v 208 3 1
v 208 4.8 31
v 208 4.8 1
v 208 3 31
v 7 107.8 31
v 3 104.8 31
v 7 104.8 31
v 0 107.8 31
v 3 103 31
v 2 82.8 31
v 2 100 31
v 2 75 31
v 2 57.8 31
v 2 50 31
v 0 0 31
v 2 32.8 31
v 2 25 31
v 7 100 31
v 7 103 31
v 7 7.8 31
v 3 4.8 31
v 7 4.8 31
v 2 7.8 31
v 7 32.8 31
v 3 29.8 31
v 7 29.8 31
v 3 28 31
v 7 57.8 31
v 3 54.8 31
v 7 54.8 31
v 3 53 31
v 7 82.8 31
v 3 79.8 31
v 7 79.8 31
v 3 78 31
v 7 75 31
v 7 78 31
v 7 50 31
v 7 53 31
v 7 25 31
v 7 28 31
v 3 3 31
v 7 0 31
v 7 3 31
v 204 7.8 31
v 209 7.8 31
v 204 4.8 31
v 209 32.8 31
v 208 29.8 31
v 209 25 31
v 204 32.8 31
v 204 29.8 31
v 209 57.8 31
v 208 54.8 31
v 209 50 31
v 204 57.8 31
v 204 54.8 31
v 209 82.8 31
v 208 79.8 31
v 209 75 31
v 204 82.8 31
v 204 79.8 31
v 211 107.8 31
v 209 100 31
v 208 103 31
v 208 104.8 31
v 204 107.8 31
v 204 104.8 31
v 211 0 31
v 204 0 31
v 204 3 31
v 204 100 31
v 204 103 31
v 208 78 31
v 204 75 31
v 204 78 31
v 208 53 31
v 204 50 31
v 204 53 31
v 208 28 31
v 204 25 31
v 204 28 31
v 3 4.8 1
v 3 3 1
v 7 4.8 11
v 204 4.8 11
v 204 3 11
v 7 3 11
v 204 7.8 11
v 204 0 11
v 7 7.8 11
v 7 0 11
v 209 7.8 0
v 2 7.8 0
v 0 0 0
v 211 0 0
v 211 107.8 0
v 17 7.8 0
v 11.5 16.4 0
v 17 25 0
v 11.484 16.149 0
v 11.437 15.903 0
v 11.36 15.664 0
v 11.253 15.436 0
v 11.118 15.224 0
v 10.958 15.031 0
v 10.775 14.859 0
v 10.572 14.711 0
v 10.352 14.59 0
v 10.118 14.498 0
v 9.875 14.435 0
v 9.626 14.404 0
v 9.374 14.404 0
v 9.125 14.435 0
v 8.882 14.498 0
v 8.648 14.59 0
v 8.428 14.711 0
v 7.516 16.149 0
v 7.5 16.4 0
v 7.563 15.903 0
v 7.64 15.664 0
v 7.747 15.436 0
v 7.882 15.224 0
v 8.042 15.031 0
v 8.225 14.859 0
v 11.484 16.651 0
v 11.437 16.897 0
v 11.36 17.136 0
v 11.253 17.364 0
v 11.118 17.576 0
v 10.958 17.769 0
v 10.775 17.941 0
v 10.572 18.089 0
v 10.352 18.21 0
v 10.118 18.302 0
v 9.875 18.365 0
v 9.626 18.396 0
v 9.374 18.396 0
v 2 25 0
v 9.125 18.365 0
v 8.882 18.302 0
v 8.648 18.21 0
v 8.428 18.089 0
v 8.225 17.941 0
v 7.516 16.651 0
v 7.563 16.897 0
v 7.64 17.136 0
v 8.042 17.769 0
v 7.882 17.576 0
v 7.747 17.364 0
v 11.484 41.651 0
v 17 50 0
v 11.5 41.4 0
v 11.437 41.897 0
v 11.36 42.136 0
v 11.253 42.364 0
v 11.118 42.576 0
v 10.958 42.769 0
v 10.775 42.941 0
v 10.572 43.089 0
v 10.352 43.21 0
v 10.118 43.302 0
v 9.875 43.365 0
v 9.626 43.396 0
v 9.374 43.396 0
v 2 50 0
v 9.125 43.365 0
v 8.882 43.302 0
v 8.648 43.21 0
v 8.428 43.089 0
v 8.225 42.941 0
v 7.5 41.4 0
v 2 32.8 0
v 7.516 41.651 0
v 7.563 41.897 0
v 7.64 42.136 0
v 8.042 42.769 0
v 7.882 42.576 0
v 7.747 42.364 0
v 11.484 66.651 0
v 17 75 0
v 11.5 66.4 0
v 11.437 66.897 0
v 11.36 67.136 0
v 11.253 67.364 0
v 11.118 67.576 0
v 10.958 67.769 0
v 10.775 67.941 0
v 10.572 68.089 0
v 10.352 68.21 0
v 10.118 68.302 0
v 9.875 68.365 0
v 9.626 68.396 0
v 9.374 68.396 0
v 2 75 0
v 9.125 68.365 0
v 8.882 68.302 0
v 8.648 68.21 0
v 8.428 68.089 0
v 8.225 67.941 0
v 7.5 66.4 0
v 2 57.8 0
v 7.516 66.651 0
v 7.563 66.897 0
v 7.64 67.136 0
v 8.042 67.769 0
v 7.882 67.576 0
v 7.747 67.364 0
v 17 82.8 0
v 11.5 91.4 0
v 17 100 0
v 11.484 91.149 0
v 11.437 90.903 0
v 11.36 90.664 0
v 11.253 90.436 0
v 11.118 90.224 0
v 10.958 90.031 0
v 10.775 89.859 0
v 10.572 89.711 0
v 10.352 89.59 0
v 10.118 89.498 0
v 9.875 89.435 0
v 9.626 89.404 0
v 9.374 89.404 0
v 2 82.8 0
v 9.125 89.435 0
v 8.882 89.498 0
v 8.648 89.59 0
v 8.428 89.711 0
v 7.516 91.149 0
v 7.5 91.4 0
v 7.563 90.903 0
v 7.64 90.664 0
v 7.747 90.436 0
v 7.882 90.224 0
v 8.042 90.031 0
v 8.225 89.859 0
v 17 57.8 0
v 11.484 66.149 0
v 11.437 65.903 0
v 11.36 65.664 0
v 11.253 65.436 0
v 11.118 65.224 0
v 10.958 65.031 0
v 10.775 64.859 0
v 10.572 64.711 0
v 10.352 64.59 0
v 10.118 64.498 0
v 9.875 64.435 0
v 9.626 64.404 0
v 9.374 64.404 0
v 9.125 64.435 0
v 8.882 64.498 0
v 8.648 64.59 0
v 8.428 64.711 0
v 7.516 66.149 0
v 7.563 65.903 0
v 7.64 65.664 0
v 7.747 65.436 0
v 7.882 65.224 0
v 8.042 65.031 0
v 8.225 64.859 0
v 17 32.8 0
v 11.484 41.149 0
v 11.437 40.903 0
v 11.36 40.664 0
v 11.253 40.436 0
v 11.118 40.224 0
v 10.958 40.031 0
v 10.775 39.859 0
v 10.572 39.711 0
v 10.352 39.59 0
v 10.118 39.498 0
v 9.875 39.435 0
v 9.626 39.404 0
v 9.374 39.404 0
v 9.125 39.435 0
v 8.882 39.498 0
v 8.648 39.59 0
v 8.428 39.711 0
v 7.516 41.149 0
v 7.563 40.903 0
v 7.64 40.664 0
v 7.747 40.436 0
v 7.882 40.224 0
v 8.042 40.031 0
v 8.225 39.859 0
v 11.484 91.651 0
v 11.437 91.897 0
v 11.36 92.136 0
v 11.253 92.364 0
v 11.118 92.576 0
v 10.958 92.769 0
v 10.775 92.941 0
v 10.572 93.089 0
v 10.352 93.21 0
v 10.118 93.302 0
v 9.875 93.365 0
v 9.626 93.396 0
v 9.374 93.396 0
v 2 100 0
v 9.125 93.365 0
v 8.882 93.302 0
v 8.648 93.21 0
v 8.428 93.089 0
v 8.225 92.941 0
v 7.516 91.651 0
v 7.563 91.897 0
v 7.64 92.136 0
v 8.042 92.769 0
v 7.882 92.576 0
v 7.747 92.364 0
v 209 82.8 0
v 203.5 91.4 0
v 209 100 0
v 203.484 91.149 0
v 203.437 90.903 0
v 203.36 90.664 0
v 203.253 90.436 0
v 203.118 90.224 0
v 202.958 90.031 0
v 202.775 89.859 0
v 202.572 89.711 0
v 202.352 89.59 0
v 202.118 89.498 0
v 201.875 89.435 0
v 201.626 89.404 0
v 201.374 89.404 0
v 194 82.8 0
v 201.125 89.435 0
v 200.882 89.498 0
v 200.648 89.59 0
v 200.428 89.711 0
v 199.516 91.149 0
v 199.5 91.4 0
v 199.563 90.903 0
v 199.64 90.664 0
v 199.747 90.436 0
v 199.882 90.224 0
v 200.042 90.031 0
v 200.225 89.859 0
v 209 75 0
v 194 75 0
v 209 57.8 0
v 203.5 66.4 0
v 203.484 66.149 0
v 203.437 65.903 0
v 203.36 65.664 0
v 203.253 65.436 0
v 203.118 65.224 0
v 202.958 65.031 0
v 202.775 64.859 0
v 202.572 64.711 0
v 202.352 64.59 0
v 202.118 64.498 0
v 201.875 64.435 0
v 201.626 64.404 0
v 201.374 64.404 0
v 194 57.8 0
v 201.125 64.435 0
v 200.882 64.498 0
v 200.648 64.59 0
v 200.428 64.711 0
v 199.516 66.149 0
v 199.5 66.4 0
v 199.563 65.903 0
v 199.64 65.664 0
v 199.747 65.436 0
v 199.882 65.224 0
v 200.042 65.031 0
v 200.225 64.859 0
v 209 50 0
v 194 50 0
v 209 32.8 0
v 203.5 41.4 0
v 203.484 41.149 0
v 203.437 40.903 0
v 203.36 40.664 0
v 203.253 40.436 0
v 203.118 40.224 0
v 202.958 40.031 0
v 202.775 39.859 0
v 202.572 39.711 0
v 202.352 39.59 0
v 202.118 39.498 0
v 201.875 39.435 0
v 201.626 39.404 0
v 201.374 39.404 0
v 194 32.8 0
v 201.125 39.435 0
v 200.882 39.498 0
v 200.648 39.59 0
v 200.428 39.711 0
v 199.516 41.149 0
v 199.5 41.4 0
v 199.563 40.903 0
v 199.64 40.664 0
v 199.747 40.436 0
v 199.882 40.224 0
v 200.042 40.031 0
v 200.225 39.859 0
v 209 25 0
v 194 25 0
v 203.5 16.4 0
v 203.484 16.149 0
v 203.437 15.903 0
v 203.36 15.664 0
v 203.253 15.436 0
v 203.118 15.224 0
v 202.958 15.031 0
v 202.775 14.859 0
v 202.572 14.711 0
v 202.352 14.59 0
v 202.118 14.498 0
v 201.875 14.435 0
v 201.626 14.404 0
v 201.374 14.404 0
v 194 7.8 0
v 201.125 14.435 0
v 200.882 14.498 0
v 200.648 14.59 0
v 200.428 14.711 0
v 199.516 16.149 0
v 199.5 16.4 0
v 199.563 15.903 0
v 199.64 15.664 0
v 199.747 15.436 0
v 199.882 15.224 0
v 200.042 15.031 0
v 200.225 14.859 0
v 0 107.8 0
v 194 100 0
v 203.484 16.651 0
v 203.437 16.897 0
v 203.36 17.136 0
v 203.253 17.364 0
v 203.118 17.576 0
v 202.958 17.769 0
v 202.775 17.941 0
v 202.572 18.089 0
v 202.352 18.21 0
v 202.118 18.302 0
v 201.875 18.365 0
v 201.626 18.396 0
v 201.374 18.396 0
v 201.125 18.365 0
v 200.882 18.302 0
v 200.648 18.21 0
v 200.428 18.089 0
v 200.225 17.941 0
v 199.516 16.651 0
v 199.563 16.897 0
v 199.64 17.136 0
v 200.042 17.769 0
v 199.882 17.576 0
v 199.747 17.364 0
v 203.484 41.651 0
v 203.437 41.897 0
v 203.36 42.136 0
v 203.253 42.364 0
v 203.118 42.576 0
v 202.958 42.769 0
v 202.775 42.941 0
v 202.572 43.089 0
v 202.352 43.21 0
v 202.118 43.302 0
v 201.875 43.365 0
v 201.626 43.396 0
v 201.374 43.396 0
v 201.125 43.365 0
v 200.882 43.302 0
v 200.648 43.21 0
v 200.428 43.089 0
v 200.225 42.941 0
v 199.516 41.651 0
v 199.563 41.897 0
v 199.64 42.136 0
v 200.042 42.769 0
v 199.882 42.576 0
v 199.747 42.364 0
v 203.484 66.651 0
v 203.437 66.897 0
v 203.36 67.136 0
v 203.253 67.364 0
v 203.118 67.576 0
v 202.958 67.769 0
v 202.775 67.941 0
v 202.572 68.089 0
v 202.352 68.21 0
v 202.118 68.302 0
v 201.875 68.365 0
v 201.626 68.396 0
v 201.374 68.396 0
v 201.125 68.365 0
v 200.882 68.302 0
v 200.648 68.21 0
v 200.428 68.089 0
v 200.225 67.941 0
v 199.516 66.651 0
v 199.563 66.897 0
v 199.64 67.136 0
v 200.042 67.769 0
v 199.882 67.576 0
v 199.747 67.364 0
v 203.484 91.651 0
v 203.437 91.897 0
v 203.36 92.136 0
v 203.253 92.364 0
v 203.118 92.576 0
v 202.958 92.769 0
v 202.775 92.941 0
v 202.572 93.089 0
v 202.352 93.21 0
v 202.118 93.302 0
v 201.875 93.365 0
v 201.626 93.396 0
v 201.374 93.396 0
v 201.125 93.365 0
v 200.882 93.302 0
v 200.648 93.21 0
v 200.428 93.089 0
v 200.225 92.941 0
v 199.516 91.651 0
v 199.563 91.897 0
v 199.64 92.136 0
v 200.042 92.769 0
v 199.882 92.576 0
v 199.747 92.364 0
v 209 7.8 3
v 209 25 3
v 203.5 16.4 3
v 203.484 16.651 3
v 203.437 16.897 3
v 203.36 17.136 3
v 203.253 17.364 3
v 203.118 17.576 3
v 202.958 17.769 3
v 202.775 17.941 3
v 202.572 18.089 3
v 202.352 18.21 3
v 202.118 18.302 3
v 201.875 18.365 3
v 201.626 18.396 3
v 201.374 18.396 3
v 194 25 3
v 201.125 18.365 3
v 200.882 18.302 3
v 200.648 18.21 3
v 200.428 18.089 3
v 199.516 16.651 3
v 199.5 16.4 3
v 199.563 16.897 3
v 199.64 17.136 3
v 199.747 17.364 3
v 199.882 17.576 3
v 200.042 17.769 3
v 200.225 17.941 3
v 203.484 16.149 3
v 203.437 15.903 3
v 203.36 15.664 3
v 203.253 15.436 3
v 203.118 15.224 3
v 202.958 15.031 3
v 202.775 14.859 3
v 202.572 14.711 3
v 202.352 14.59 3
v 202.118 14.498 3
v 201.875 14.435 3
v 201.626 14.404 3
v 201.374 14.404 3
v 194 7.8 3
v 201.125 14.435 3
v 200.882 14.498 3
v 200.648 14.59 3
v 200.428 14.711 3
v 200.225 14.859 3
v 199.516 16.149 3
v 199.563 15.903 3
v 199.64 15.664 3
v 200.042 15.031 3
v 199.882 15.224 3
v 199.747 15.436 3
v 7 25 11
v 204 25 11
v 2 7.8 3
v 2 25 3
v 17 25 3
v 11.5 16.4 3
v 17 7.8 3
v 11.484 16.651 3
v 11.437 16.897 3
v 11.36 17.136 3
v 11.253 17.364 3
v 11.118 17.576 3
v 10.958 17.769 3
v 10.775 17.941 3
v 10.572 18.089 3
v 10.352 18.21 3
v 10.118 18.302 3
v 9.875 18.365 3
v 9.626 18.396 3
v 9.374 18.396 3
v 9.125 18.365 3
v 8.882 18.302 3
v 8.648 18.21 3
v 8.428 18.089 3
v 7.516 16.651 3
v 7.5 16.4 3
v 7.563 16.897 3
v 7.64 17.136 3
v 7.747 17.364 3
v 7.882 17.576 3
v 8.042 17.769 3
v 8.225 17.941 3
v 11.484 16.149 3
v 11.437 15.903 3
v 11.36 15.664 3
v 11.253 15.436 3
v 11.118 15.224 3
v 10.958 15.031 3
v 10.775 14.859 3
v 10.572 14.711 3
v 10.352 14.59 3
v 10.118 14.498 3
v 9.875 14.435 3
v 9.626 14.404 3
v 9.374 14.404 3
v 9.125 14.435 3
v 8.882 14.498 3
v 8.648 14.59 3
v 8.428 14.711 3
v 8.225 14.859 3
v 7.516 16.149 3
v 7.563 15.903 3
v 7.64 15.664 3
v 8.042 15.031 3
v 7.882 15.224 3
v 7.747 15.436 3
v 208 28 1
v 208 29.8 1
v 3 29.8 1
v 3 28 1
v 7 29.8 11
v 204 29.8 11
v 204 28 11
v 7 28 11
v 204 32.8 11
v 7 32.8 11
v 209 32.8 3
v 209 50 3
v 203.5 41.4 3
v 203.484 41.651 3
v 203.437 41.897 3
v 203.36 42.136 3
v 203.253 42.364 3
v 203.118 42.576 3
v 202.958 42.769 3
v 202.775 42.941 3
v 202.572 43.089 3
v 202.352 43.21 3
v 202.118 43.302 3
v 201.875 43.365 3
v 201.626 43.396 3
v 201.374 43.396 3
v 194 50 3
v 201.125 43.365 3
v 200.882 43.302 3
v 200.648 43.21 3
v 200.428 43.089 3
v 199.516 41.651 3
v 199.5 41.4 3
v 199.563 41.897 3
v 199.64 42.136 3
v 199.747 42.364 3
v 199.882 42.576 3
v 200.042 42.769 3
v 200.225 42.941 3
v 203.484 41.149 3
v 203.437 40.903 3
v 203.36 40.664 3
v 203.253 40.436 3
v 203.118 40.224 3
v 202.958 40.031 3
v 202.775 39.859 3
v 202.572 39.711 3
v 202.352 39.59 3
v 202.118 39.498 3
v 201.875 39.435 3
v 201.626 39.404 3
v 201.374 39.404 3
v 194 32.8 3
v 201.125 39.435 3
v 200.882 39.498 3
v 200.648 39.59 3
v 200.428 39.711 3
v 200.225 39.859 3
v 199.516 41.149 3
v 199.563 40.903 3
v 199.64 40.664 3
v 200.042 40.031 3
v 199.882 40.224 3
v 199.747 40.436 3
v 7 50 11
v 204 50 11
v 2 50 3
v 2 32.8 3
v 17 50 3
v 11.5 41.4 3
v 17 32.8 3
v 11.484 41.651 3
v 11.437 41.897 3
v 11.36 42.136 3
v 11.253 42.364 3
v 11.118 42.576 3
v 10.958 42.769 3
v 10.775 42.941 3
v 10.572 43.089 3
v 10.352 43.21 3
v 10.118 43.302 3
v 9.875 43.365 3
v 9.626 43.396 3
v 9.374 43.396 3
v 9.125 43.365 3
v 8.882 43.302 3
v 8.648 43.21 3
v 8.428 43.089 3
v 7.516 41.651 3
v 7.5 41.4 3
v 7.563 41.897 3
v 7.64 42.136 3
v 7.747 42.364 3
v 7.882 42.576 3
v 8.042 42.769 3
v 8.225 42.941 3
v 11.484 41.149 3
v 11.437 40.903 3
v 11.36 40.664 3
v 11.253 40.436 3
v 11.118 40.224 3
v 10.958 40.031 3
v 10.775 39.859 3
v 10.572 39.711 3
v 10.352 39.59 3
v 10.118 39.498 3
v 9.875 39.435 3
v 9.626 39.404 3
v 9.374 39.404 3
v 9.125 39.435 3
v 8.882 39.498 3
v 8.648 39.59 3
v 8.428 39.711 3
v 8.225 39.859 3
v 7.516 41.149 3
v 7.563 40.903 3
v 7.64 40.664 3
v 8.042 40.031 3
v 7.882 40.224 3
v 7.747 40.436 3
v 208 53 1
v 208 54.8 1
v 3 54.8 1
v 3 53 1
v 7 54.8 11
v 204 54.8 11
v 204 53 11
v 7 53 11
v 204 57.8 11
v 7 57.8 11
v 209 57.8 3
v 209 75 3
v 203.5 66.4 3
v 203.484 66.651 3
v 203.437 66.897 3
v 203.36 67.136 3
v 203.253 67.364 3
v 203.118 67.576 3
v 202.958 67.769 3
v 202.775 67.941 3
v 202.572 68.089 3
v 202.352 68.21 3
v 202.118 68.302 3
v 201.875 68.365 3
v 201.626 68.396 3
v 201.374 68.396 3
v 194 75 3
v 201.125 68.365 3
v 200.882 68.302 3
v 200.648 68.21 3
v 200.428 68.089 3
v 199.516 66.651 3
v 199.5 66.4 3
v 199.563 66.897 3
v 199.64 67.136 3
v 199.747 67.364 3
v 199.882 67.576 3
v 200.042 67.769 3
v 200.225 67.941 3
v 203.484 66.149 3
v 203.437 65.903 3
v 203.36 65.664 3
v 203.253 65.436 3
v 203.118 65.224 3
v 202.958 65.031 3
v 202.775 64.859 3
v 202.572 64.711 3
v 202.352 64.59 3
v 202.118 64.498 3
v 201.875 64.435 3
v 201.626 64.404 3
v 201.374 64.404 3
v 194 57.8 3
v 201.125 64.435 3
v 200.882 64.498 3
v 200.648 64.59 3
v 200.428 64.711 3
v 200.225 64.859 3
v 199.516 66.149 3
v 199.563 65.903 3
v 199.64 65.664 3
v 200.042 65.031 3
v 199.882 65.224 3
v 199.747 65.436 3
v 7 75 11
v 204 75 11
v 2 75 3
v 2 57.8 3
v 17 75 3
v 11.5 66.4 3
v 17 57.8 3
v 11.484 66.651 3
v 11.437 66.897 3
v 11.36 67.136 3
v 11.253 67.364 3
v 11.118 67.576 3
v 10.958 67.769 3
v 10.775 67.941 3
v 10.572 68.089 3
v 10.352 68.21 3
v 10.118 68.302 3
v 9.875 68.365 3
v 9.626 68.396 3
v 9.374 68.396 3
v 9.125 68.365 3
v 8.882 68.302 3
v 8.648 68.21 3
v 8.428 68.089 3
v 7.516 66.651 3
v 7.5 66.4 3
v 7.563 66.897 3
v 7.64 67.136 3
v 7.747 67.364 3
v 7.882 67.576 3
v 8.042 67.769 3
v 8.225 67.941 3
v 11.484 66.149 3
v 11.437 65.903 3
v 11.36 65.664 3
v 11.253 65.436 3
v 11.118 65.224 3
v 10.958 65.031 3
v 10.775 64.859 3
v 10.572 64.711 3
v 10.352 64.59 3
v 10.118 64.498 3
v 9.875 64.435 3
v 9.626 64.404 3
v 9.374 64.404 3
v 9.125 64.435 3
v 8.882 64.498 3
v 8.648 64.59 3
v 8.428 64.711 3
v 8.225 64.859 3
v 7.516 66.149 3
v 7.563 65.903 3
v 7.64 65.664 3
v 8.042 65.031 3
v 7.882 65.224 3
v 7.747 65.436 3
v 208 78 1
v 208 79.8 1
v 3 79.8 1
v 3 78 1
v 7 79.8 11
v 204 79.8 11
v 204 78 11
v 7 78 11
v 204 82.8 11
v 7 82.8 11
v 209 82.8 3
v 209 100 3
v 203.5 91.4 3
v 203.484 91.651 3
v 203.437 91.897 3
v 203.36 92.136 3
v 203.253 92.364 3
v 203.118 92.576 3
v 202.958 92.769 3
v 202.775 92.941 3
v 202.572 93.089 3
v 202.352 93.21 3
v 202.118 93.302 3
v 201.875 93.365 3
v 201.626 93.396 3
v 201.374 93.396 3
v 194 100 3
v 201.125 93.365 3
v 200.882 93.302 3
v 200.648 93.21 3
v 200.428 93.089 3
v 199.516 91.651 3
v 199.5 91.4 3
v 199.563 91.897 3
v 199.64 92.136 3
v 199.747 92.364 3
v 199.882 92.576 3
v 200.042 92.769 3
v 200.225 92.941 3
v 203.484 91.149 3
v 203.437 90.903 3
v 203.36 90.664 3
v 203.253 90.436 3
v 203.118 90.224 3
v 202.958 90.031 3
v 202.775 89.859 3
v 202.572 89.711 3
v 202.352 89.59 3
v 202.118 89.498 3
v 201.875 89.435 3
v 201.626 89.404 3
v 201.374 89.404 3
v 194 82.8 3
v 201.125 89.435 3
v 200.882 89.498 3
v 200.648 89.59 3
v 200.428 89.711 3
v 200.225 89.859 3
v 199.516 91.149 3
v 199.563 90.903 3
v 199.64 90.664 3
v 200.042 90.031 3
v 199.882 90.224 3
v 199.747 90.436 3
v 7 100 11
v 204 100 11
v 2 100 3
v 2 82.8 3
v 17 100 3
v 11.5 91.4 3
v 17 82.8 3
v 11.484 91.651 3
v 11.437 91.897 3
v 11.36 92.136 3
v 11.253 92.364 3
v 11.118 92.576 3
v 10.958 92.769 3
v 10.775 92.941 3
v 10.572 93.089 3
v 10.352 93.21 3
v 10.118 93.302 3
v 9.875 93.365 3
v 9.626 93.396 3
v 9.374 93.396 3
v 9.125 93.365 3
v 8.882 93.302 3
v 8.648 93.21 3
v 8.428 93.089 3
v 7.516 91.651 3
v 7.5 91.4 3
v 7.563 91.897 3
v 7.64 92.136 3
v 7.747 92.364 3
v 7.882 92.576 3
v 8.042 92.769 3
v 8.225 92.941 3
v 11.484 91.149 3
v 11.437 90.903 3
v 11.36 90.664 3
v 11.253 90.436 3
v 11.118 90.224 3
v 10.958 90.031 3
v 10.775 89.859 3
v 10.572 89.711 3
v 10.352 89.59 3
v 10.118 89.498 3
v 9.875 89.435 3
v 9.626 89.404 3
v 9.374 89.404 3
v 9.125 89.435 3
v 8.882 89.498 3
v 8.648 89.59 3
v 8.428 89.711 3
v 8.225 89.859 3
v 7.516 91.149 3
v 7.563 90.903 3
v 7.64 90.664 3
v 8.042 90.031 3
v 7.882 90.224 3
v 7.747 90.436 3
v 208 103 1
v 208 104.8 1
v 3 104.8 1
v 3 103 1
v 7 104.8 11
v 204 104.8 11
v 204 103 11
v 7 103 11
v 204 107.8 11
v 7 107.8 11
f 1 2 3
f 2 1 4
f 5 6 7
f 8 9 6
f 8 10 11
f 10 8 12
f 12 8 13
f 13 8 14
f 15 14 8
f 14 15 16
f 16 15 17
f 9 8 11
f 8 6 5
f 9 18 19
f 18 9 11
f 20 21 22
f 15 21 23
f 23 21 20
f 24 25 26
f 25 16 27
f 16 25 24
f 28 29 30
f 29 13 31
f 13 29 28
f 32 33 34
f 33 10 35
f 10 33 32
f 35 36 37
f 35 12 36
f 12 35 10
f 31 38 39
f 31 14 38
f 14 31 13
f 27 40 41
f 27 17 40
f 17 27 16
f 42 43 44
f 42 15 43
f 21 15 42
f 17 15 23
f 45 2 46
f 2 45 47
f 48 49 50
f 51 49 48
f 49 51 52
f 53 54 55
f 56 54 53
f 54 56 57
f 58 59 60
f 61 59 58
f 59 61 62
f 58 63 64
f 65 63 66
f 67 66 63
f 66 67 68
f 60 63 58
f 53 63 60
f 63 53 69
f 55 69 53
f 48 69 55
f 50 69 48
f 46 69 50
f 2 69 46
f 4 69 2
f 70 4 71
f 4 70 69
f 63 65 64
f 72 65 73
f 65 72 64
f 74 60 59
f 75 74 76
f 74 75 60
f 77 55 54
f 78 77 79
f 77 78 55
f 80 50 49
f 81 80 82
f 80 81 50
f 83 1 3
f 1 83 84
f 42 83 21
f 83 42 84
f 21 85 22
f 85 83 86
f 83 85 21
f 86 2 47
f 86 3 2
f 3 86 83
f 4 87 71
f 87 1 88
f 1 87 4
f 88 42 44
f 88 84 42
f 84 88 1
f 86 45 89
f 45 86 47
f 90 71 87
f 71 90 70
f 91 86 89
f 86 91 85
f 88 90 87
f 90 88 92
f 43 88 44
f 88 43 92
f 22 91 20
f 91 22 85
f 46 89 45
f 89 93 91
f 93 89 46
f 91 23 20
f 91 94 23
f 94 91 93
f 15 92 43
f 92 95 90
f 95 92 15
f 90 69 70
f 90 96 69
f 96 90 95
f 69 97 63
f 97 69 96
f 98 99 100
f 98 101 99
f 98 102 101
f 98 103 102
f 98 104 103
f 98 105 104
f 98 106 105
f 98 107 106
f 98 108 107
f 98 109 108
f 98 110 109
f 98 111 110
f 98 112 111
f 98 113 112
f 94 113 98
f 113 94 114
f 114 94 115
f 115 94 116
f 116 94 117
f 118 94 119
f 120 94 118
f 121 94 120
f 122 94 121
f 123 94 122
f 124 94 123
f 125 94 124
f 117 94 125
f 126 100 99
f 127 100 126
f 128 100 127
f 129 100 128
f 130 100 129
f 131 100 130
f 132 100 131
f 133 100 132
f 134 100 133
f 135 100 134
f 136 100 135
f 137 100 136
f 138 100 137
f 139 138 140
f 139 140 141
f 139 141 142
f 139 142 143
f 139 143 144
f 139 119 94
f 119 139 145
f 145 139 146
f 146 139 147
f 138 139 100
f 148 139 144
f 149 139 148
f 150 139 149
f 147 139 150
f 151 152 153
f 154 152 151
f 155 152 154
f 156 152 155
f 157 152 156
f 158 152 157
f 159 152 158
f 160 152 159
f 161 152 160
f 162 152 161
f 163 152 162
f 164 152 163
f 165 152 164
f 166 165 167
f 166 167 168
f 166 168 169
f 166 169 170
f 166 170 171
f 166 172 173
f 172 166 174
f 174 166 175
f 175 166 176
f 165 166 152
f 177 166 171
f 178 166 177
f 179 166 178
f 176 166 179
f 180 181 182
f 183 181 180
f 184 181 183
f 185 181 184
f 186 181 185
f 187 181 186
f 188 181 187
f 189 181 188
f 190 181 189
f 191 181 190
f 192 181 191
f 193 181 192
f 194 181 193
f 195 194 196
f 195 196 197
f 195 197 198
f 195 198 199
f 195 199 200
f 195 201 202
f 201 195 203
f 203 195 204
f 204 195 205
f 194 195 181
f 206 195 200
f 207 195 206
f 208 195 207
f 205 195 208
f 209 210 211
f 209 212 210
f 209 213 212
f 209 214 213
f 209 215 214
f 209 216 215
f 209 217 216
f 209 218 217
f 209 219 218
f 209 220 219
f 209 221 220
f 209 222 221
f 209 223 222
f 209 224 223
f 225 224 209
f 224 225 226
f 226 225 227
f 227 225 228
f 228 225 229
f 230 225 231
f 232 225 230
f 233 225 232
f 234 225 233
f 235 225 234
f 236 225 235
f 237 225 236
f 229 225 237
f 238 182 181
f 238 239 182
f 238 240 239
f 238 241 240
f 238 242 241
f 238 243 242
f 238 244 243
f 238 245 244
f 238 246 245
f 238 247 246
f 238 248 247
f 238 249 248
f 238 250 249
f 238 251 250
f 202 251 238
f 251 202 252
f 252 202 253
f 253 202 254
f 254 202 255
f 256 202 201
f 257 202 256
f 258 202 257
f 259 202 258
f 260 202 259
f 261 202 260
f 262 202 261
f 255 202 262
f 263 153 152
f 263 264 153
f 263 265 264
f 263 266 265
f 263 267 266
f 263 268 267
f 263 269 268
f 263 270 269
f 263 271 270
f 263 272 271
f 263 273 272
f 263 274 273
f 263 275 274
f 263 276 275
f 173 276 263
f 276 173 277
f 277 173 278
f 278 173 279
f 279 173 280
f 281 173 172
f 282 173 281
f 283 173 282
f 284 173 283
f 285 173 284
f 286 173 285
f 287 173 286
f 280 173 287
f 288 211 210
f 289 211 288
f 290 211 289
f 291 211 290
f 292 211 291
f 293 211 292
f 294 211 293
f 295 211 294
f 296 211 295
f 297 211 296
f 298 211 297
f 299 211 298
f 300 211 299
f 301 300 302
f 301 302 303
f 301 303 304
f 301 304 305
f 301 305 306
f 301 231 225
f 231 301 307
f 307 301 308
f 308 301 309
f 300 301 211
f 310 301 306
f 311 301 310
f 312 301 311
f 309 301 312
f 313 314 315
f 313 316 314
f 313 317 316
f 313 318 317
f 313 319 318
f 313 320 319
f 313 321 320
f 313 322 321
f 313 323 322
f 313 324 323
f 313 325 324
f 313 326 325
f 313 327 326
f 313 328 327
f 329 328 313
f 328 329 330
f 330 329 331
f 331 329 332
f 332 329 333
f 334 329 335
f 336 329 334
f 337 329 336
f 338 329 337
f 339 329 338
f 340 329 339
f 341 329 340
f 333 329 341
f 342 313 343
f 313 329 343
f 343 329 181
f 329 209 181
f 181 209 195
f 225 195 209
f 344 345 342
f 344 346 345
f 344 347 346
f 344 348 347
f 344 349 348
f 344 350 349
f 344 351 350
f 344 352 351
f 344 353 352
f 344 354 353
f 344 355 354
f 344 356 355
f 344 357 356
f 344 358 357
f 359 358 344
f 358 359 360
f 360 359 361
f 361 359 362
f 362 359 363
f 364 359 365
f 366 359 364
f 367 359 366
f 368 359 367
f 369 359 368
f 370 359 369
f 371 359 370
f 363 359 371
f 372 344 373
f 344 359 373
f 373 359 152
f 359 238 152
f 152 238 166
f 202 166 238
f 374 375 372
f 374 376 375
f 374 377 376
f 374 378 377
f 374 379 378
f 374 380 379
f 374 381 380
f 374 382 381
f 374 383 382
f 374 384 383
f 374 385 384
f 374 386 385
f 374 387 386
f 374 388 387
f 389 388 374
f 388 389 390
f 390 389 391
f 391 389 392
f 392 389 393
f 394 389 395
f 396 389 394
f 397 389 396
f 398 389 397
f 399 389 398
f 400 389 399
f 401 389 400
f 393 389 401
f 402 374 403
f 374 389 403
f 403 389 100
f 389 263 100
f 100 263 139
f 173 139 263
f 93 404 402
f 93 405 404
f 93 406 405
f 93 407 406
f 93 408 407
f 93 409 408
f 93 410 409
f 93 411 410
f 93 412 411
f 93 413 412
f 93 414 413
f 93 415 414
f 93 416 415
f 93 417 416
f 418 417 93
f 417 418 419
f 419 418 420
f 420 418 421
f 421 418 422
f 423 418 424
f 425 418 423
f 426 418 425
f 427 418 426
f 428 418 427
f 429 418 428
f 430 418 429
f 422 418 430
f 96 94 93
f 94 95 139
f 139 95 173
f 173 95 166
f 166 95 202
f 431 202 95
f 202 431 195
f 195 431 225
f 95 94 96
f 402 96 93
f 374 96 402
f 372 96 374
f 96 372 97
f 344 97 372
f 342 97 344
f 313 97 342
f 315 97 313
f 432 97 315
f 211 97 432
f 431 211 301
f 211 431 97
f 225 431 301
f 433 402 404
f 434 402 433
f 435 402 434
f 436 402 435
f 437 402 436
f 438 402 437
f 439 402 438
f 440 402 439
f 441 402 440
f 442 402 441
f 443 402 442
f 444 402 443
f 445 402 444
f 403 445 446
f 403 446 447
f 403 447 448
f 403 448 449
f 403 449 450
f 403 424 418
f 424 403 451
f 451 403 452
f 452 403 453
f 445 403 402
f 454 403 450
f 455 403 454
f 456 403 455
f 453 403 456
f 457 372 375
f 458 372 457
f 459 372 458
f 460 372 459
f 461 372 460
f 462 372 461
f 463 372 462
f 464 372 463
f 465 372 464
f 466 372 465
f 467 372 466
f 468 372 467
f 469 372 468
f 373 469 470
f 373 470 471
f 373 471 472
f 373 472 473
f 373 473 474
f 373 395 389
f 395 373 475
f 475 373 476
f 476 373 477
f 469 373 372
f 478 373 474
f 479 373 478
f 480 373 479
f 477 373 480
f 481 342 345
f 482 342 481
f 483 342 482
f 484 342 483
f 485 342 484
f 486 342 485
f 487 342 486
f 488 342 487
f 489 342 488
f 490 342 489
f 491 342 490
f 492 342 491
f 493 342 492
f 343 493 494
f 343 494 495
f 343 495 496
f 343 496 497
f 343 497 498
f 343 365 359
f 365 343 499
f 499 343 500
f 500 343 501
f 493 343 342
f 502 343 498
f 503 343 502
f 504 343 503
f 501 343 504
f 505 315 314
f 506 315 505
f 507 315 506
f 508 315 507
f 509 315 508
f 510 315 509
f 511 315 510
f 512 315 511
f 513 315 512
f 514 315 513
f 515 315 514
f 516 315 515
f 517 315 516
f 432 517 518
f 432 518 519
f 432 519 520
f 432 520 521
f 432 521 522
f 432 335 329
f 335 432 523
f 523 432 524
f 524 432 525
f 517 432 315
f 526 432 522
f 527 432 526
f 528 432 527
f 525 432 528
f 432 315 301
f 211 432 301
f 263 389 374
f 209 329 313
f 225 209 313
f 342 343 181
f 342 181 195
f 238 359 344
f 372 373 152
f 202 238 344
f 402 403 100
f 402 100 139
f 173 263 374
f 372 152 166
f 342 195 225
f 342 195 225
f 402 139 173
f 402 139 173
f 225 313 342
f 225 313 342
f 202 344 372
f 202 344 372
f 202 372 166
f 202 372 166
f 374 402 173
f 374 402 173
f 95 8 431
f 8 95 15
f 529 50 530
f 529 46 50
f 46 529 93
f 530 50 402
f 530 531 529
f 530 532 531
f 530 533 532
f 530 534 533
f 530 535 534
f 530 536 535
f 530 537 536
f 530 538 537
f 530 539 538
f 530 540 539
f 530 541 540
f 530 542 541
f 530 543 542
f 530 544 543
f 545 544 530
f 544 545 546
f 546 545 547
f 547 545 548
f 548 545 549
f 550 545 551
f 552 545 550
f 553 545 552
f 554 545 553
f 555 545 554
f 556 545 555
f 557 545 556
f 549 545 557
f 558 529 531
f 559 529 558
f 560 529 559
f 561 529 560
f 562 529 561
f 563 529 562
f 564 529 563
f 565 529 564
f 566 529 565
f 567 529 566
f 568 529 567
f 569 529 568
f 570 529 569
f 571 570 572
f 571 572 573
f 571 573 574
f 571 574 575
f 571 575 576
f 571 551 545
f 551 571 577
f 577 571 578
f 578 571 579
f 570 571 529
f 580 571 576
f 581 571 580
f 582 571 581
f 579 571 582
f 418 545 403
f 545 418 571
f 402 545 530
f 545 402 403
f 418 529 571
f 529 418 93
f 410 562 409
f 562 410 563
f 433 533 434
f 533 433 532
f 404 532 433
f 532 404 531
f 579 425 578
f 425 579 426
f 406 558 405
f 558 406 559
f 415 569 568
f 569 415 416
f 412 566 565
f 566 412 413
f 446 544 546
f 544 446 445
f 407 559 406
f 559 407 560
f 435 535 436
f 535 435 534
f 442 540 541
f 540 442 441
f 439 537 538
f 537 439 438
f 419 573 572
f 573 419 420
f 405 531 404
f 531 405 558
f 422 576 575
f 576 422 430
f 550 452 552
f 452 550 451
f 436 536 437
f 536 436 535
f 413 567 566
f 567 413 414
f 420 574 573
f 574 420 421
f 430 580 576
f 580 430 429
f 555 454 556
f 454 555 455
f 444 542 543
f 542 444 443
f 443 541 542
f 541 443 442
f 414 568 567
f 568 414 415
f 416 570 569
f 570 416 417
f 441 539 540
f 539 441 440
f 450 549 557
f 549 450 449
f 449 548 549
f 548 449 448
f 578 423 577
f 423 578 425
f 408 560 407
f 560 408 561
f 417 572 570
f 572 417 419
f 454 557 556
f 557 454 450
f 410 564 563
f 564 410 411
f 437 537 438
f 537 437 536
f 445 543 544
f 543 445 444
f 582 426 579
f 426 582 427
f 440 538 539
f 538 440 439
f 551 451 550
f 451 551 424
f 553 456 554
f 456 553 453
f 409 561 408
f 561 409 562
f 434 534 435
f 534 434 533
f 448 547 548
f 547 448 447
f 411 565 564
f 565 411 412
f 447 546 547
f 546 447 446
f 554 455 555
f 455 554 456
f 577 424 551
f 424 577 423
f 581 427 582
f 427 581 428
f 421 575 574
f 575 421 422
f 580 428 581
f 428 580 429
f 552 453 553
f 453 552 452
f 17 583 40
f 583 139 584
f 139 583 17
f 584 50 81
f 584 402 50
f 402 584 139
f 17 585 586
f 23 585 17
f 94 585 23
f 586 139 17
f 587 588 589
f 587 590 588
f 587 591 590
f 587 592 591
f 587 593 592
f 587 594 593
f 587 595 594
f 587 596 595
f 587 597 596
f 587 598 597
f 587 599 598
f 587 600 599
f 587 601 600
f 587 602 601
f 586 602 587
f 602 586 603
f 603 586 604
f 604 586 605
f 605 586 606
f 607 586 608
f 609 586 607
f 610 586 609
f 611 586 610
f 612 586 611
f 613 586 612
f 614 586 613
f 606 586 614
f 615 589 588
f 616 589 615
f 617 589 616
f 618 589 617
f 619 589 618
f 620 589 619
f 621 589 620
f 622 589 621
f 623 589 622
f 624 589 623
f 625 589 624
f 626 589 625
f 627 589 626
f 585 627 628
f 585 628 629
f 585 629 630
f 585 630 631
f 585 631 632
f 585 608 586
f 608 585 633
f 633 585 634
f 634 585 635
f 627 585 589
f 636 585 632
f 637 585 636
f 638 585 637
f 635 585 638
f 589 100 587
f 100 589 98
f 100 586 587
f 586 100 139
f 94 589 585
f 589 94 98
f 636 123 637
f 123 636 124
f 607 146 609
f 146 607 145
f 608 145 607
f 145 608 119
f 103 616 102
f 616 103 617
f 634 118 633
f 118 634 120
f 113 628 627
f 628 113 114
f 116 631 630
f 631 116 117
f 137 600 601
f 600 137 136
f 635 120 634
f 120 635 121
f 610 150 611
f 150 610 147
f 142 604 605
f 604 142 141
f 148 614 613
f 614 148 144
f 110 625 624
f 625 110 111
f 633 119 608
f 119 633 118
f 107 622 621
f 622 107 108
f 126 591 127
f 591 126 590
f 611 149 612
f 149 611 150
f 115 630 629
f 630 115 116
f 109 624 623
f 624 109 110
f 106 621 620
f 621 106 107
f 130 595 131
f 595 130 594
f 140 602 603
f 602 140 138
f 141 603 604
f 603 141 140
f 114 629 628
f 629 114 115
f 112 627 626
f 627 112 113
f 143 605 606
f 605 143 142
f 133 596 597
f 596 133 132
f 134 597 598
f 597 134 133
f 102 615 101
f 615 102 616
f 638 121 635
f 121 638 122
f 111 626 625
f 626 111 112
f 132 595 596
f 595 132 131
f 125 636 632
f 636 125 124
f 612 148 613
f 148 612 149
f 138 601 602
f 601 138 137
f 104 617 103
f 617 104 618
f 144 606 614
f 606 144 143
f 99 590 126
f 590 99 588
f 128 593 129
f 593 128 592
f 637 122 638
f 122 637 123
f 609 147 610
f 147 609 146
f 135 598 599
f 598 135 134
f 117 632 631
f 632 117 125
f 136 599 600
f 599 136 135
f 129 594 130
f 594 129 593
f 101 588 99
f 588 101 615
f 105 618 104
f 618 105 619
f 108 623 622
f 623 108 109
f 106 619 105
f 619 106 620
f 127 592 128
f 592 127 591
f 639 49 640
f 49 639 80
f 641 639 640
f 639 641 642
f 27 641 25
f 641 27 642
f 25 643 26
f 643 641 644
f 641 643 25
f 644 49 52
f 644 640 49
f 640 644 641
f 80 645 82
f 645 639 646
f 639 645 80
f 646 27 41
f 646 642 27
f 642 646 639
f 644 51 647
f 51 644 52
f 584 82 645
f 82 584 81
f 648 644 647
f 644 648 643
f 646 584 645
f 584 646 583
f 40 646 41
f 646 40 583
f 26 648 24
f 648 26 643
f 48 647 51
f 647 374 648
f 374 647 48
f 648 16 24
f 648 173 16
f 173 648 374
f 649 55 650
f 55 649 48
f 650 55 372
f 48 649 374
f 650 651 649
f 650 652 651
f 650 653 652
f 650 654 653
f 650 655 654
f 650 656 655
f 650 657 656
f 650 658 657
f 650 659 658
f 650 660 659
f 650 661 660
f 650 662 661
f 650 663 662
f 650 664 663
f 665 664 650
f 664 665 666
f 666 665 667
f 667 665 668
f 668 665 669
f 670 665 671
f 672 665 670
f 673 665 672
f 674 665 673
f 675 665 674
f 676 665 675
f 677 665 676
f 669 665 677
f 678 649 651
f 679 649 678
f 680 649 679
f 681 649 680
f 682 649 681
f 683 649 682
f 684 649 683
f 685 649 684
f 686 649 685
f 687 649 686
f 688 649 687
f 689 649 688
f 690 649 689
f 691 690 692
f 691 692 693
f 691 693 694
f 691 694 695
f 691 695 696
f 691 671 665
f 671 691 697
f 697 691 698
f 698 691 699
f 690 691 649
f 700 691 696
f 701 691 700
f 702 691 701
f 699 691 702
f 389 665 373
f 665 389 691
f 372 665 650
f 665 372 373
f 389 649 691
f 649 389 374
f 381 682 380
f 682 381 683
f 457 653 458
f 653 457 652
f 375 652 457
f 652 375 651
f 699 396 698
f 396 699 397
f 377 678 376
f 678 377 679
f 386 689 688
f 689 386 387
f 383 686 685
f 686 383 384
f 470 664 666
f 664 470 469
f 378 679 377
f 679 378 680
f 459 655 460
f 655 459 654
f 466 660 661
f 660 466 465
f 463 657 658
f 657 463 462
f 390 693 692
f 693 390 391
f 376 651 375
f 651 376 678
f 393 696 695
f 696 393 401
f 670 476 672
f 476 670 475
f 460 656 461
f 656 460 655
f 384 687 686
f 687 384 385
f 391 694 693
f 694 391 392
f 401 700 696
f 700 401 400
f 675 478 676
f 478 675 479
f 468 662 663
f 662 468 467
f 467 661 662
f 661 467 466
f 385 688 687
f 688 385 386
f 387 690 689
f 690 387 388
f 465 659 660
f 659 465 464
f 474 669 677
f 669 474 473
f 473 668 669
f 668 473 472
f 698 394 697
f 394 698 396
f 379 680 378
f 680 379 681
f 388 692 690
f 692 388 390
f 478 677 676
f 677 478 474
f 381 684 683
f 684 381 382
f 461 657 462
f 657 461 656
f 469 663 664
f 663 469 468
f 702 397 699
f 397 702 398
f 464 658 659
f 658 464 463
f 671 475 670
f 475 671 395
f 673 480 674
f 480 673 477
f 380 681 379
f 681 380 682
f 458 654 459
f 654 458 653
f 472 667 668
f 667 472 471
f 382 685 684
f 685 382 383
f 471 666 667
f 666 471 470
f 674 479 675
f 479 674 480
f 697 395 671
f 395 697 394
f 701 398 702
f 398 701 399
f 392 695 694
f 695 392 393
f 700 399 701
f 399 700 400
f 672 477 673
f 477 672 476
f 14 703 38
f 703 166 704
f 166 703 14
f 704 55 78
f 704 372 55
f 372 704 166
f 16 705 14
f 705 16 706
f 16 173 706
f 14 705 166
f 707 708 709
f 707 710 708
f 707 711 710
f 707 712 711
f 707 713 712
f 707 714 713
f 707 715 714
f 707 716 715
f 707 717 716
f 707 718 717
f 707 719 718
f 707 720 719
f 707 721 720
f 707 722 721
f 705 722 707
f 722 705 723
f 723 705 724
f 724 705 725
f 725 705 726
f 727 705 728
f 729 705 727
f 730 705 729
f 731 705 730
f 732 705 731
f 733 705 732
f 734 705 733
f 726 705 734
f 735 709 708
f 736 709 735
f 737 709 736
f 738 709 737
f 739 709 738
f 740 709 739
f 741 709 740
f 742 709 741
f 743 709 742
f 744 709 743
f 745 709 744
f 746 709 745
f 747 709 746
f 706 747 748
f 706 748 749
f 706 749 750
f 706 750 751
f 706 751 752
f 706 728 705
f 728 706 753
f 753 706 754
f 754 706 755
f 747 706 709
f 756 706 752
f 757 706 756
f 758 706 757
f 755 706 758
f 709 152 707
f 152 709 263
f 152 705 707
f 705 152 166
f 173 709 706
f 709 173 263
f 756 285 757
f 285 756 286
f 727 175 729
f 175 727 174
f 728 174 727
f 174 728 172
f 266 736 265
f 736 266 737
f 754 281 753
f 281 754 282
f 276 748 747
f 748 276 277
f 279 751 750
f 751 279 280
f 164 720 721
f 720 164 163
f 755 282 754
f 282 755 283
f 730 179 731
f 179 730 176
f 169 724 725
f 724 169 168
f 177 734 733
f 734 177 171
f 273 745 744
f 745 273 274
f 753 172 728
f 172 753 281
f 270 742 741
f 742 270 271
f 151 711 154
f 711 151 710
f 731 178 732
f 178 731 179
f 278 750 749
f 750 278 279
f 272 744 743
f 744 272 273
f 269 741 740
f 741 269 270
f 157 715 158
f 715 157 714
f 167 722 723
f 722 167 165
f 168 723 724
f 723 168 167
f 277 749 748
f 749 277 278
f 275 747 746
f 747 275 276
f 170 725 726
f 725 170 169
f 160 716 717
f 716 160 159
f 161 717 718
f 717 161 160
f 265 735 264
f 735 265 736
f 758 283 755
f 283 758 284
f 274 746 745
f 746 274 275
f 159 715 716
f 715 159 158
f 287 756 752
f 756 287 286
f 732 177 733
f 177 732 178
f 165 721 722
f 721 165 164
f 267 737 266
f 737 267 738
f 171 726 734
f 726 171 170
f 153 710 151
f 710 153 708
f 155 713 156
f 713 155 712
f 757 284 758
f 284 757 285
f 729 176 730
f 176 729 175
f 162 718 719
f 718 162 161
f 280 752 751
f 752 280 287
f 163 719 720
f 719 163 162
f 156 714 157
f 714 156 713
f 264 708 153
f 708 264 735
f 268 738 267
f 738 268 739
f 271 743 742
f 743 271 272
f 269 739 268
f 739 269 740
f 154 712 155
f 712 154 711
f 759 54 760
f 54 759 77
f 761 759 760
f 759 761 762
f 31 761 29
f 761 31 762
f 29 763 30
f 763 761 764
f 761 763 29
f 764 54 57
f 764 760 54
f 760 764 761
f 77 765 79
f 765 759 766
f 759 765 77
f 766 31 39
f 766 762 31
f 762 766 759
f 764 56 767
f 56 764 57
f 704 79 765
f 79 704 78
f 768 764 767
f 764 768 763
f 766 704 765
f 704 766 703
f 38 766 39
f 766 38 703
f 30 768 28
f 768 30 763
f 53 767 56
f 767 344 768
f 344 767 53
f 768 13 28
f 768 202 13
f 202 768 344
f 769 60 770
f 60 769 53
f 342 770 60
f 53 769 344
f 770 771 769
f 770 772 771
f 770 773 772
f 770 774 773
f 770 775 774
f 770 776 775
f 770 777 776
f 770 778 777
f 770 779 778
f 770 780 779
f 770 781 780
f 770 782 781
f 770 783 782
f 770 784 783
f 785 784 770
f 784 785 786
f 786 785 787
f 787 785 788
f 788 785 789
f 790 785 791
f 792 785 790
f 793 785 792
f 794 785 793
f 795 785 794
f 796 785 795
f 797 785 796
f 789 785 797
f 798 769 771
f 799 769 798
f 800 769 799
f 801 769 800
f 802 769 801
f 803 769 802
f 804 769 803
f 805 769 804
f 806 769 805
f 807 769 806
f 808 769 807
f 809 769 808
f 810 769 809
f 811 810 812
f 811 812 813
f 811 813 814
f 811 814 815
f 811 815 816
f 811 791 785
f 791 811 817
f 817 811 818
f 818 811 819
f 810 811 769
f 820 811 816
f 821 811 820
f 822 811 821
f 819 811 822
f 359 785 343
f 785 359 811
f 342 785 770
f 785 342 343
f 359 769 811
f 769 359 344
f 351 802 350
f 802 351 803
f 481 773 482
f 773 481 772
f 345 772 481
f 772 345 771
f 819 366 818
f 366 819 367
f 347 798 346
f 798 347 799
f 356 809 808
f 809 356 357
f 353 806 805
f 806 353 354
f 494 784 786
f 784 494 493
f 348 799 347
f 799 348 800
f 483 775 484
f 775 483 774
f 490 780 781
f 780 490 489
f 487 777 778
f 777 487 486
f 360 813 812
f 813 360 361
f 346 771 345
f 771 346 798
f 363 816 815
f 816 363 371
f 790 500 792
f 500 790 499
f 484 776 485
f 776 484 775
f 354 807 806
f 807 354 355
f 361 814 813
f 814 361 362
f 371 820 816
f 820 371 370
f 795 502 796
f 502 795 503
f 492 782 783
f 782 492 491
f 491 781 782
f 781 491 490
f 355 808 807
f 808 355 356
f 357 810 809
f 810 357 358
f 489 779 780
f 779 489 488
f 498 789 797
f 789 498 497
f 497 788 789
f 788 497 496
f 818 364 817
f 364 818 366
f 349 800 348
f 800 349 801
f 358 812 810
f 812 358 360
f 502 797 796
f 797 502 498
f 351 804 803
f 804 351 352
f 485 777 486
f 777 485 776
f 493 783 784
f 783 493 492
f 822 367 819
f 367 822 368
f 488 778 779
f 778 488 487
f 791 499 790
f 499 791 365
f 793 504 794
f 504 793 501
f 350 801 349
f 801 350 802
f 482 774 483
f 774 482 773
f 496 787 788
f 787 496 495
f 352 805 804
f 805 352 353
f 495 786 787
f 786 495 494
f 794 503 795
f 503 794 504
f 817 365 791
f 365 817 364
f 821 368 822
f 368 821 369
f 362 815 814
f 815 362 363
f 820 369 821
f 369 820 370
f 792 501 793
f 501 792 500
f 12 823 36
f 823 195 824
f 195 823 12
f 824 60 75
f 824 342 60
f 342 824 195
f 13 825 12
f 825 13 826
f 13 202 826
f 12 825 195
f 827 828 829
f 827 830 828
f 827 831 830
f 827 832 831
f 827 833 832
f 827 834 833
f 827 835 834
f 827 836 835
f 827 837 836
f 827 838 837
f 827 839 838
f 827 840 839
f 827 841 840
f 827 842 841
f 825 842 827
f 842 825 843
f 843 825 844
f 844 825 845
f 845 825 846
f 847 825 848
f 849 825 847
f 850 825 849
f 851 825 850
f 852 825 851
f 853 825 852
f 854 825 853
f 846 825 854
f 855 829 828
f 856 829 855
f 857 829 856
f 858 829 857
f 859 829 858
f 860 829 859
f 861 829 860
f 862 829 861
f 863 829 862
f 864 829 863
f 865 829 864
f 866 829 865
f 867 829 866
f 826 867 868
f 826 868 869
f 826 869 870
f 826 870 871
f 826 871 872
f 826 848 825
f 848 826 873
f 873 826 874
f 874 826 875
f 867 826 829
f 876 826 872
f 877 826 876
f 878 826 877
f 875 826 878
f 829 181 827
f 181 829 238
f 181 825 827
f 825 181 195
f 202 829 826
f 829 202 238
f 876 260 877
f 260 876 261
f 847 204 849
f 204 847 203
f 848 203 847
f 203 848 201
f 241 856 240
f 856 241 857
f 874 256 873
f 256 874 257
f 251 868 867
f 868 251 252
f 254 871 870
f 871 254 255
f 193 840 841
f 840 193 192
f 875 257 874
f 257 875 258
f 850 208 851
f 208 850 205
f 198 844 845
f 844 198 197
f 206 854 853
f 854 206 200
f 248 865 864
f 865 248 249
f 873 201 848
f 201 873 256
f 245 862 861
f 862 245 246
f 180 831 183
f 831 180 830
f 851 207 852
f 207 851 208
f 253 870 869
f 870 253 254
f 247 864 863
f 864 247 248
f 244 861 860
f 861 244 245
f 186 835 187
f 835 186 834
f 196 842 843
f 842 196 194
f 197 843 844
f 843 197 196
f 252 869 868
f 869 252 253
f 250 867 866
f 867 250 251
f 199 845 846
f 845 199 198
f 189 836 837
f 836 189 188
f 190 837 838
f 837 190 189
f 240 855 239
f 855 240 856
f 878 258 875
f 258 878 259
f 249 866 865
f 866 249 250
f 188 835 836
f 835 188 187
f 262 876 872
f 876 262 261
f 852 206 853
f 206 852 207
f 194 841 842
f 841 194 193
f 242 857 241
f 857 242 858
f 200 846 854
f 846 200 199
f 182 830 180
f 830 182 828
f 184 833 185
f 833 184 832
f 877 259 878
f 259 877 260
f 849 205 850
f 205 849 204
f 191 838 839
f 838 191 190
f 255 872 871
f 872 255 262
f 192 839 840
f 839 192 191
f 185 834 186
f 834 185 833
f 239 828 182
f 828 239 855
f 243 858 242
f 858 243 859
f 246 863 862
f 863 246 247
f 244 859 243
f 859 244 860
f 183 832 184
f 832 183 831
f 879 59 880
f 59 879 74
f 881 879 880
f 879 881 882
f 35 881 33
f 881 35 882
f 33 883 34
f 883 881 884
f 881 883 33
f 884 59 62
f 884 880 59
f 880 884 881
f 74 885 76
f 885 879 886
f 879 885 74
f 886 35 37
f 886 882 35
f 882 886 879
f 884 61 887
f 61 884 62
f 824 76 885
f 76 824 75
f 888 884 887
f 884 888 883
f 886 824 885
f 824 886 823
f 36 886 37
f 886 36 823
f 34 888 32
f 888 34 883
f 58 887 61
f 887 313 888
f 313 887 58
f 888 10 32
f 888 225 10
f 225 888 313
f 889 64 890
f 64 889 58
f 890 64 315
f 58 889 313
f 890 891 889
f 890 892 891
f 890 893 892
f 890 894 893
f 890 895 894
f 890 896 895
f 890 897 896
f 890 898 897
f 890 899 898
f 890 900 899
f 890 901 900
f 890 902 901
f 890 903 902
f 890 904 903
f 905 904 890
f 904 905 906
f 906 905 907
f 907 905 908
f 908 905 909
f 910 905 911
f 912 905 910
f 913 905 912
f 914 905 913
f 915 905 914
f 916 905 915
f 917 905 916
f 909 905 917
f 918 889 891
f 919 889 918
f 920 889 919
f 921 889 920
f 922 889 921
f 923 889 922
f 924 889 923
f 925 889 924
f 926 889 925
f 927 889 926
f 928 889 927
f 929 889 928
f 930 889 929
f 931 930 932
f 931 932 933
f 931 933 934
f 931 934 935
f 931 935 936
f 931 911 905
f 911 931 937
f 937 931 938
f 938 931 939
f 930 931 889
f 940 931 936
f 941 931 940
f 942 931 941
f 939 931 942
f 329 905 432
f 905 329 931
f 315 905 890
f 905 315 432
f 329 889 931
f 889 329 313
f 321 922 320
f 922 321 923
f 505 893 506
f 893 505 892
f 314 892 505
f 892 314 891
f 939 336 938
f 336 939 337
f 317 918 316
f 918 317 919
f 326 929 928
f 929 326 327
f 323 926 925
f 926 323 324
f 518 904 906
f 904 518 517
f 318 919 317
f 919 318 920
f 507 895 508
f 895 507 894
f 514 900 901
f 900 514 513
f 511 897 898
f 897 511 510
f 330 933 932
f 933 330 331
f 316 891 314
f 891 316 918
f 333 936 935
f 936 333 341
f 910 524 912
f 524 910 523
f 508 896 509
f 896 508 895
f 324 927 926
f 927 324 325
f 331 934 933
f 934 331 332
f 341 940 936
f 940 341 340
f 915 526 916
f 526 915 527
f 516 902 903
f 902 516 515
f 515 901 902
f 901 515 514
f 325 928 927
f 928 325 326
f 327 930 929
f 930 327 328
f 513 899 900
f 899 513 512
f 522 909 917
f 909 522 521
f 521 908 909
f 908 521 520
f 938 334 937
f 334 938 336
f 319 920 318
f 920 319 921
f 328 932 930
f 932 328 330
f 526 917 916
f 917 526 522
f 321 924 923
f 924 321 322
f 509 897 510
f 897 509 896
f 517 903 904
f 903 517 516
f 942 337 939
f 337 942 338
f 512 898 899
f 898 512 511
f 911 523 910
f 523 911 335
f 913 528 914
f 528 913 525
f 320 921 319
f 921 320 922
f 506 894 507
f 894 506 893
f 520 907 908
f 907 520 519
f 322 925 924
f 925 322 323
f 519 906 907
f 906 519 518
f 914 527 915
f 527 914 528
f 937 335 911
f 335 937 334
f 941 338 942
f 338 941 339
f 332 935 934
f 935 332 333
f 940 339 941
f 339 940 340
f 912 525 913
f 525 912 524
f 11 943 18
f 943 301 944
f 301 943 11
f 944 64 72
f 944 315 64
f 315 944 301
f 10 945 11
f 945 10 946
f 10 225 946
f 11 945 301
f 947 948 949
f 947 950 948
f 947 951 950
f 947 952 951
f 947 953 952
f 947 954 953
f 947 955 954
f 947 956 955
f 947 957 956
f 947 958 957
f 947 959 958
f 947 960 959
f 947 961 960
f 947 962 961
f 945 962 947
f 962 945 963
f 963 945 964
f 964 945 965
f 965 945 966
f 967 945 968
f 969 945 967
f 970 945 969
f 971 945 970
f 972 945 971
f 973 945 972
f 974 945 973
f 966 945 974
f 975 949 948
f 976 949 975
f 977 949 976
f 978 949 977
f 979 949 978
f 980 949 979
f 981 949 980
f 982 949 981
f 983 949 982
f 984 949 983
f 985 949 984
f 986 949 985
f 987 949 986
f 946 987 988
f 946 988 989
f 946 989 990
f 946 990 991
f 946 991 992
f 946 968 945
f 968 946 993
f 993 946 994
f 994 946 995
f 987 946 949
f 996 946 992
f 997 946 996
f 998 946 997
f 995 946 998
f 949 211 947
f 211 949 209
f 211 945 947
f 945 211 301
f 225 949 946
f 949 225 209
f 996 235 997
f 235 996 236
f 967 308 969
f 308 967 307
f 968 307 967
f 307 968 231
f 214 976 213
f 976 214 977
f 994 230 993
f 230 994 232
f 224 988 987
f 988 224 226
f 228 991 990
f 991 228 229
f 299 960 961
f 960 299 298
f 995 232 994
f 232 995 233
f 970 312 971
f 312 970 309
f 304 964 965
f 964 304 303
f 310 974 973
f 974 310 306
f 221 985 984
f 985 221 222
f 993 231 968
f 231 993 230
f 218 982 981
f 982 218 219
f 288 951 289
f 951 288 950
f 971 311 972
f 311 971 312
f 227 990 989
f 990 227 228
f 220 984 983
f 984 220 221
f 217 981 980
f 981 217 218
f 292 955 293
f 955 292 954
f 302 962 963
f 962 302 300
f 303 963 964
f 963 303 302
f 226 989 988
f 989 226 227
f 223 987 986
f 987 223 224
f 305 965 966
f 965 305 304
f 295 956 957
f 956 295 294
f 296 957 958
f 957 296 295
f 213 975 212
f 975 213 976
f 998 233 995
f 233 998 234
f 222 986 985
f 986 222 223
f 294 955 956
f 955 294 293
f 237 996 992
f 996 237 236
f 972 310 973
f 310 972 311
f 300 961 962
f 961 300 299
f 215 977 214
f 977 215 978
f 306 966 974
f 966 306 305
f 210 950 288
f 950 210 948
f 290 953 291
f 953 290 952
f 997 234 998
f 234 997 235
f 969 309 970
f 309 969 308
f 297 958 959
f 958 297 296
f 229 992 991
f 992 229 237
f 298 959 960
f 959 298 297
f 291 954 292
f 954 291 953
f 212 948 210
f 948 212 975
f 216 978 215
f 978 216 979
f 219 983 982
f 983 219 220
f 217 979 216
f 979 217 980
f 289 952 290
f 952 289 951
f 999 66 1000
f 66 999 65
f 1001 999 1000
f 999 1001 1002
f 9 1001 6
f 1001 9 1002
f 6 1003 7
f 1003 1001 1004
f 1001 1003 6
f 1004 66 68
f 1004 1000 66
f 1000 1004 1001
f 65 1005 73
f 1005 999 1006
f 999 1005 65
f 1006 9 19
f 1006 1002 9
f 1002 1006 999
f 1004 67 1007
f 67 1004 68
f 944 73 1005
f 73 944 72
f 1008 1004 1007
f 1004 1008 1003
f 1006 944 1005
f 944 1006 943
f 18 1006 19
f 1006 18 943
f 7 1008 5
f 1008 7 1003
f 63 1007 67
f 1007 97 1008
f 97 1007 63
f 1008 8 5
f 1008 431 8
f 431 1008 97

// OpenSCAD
// file: lib/gemini-storage-rack.scad
// Gemini Storage Rack
// By Hans Christian Saustrup <hc@saustrup.net>

module gemini_storage_rack(cards) {

  pcb = [205, 1.80, 205];

  slot = [pcb.x, pcb.y, 30];

  socket_thickness = [3, 3, 1];
  socket = [
    (socket_thickness.x * 2) + (slot.x),
    (socket_thickness.y * 2) + (slot.y),
    (socket_thickness.z) + slot.z,
  ];

  support_thickness = 2;

  screwplate_height = 3;
  screwplate_width = 15;

  slot_offset = [(socket.x - slot.x) / 2, (socket.y - slot.y) / 2, socket_thickness.z];

  connector_cutout = [slot.x - 8, socket.y, socket.z];
  connector_cutout_offset = [(socket.x - connector_cutout.x) / 2, 0, socket_thickness.z + 10];

  card_spacing = 25;

  for (card = [0:cards - 1])
    translate([0, card * card_spacing, 0]) {
      difference() {
        cube(socket);
        union() {
          translate(slot_offset) cube(slot);
          translate(connector_cutout_offset) cube(connector_cutout);
        }
      }
      if (card < cards - 1) {
        translate([socket.x / 2, 0, 0]) {

          for (m = [0, 1])
            mirror([m, 0, 0]) {
              translate([(socket.x / 2) - support_thickness, socket.y, 0])
                cube([support_thickness, card_spacing - socket.y, socket.z]);

              translate([(socket.x / 2) - screwplate_width - support_thickness, socket.y, 0])
              difference() {
                cube([screwplate_width, card_spacing - socket.y, screwplate_height]);
                translate([screwplate_width/2,(card_spacing - socket.y)/2,0])
                  cylinder(r=2, h=screwplate_height, center=false);
              }
            }           
        }
      }
    }
}
// main file
// Gemini Storage Rack
// By Hans Christian Saustrup <hc@saustrup.net>
model_version = "v0.0.1";

use <lib/gemini-storage-rack.scad>

$fn = $preview ? 0 : 50;

gemini_storage_rack(cards=5);
